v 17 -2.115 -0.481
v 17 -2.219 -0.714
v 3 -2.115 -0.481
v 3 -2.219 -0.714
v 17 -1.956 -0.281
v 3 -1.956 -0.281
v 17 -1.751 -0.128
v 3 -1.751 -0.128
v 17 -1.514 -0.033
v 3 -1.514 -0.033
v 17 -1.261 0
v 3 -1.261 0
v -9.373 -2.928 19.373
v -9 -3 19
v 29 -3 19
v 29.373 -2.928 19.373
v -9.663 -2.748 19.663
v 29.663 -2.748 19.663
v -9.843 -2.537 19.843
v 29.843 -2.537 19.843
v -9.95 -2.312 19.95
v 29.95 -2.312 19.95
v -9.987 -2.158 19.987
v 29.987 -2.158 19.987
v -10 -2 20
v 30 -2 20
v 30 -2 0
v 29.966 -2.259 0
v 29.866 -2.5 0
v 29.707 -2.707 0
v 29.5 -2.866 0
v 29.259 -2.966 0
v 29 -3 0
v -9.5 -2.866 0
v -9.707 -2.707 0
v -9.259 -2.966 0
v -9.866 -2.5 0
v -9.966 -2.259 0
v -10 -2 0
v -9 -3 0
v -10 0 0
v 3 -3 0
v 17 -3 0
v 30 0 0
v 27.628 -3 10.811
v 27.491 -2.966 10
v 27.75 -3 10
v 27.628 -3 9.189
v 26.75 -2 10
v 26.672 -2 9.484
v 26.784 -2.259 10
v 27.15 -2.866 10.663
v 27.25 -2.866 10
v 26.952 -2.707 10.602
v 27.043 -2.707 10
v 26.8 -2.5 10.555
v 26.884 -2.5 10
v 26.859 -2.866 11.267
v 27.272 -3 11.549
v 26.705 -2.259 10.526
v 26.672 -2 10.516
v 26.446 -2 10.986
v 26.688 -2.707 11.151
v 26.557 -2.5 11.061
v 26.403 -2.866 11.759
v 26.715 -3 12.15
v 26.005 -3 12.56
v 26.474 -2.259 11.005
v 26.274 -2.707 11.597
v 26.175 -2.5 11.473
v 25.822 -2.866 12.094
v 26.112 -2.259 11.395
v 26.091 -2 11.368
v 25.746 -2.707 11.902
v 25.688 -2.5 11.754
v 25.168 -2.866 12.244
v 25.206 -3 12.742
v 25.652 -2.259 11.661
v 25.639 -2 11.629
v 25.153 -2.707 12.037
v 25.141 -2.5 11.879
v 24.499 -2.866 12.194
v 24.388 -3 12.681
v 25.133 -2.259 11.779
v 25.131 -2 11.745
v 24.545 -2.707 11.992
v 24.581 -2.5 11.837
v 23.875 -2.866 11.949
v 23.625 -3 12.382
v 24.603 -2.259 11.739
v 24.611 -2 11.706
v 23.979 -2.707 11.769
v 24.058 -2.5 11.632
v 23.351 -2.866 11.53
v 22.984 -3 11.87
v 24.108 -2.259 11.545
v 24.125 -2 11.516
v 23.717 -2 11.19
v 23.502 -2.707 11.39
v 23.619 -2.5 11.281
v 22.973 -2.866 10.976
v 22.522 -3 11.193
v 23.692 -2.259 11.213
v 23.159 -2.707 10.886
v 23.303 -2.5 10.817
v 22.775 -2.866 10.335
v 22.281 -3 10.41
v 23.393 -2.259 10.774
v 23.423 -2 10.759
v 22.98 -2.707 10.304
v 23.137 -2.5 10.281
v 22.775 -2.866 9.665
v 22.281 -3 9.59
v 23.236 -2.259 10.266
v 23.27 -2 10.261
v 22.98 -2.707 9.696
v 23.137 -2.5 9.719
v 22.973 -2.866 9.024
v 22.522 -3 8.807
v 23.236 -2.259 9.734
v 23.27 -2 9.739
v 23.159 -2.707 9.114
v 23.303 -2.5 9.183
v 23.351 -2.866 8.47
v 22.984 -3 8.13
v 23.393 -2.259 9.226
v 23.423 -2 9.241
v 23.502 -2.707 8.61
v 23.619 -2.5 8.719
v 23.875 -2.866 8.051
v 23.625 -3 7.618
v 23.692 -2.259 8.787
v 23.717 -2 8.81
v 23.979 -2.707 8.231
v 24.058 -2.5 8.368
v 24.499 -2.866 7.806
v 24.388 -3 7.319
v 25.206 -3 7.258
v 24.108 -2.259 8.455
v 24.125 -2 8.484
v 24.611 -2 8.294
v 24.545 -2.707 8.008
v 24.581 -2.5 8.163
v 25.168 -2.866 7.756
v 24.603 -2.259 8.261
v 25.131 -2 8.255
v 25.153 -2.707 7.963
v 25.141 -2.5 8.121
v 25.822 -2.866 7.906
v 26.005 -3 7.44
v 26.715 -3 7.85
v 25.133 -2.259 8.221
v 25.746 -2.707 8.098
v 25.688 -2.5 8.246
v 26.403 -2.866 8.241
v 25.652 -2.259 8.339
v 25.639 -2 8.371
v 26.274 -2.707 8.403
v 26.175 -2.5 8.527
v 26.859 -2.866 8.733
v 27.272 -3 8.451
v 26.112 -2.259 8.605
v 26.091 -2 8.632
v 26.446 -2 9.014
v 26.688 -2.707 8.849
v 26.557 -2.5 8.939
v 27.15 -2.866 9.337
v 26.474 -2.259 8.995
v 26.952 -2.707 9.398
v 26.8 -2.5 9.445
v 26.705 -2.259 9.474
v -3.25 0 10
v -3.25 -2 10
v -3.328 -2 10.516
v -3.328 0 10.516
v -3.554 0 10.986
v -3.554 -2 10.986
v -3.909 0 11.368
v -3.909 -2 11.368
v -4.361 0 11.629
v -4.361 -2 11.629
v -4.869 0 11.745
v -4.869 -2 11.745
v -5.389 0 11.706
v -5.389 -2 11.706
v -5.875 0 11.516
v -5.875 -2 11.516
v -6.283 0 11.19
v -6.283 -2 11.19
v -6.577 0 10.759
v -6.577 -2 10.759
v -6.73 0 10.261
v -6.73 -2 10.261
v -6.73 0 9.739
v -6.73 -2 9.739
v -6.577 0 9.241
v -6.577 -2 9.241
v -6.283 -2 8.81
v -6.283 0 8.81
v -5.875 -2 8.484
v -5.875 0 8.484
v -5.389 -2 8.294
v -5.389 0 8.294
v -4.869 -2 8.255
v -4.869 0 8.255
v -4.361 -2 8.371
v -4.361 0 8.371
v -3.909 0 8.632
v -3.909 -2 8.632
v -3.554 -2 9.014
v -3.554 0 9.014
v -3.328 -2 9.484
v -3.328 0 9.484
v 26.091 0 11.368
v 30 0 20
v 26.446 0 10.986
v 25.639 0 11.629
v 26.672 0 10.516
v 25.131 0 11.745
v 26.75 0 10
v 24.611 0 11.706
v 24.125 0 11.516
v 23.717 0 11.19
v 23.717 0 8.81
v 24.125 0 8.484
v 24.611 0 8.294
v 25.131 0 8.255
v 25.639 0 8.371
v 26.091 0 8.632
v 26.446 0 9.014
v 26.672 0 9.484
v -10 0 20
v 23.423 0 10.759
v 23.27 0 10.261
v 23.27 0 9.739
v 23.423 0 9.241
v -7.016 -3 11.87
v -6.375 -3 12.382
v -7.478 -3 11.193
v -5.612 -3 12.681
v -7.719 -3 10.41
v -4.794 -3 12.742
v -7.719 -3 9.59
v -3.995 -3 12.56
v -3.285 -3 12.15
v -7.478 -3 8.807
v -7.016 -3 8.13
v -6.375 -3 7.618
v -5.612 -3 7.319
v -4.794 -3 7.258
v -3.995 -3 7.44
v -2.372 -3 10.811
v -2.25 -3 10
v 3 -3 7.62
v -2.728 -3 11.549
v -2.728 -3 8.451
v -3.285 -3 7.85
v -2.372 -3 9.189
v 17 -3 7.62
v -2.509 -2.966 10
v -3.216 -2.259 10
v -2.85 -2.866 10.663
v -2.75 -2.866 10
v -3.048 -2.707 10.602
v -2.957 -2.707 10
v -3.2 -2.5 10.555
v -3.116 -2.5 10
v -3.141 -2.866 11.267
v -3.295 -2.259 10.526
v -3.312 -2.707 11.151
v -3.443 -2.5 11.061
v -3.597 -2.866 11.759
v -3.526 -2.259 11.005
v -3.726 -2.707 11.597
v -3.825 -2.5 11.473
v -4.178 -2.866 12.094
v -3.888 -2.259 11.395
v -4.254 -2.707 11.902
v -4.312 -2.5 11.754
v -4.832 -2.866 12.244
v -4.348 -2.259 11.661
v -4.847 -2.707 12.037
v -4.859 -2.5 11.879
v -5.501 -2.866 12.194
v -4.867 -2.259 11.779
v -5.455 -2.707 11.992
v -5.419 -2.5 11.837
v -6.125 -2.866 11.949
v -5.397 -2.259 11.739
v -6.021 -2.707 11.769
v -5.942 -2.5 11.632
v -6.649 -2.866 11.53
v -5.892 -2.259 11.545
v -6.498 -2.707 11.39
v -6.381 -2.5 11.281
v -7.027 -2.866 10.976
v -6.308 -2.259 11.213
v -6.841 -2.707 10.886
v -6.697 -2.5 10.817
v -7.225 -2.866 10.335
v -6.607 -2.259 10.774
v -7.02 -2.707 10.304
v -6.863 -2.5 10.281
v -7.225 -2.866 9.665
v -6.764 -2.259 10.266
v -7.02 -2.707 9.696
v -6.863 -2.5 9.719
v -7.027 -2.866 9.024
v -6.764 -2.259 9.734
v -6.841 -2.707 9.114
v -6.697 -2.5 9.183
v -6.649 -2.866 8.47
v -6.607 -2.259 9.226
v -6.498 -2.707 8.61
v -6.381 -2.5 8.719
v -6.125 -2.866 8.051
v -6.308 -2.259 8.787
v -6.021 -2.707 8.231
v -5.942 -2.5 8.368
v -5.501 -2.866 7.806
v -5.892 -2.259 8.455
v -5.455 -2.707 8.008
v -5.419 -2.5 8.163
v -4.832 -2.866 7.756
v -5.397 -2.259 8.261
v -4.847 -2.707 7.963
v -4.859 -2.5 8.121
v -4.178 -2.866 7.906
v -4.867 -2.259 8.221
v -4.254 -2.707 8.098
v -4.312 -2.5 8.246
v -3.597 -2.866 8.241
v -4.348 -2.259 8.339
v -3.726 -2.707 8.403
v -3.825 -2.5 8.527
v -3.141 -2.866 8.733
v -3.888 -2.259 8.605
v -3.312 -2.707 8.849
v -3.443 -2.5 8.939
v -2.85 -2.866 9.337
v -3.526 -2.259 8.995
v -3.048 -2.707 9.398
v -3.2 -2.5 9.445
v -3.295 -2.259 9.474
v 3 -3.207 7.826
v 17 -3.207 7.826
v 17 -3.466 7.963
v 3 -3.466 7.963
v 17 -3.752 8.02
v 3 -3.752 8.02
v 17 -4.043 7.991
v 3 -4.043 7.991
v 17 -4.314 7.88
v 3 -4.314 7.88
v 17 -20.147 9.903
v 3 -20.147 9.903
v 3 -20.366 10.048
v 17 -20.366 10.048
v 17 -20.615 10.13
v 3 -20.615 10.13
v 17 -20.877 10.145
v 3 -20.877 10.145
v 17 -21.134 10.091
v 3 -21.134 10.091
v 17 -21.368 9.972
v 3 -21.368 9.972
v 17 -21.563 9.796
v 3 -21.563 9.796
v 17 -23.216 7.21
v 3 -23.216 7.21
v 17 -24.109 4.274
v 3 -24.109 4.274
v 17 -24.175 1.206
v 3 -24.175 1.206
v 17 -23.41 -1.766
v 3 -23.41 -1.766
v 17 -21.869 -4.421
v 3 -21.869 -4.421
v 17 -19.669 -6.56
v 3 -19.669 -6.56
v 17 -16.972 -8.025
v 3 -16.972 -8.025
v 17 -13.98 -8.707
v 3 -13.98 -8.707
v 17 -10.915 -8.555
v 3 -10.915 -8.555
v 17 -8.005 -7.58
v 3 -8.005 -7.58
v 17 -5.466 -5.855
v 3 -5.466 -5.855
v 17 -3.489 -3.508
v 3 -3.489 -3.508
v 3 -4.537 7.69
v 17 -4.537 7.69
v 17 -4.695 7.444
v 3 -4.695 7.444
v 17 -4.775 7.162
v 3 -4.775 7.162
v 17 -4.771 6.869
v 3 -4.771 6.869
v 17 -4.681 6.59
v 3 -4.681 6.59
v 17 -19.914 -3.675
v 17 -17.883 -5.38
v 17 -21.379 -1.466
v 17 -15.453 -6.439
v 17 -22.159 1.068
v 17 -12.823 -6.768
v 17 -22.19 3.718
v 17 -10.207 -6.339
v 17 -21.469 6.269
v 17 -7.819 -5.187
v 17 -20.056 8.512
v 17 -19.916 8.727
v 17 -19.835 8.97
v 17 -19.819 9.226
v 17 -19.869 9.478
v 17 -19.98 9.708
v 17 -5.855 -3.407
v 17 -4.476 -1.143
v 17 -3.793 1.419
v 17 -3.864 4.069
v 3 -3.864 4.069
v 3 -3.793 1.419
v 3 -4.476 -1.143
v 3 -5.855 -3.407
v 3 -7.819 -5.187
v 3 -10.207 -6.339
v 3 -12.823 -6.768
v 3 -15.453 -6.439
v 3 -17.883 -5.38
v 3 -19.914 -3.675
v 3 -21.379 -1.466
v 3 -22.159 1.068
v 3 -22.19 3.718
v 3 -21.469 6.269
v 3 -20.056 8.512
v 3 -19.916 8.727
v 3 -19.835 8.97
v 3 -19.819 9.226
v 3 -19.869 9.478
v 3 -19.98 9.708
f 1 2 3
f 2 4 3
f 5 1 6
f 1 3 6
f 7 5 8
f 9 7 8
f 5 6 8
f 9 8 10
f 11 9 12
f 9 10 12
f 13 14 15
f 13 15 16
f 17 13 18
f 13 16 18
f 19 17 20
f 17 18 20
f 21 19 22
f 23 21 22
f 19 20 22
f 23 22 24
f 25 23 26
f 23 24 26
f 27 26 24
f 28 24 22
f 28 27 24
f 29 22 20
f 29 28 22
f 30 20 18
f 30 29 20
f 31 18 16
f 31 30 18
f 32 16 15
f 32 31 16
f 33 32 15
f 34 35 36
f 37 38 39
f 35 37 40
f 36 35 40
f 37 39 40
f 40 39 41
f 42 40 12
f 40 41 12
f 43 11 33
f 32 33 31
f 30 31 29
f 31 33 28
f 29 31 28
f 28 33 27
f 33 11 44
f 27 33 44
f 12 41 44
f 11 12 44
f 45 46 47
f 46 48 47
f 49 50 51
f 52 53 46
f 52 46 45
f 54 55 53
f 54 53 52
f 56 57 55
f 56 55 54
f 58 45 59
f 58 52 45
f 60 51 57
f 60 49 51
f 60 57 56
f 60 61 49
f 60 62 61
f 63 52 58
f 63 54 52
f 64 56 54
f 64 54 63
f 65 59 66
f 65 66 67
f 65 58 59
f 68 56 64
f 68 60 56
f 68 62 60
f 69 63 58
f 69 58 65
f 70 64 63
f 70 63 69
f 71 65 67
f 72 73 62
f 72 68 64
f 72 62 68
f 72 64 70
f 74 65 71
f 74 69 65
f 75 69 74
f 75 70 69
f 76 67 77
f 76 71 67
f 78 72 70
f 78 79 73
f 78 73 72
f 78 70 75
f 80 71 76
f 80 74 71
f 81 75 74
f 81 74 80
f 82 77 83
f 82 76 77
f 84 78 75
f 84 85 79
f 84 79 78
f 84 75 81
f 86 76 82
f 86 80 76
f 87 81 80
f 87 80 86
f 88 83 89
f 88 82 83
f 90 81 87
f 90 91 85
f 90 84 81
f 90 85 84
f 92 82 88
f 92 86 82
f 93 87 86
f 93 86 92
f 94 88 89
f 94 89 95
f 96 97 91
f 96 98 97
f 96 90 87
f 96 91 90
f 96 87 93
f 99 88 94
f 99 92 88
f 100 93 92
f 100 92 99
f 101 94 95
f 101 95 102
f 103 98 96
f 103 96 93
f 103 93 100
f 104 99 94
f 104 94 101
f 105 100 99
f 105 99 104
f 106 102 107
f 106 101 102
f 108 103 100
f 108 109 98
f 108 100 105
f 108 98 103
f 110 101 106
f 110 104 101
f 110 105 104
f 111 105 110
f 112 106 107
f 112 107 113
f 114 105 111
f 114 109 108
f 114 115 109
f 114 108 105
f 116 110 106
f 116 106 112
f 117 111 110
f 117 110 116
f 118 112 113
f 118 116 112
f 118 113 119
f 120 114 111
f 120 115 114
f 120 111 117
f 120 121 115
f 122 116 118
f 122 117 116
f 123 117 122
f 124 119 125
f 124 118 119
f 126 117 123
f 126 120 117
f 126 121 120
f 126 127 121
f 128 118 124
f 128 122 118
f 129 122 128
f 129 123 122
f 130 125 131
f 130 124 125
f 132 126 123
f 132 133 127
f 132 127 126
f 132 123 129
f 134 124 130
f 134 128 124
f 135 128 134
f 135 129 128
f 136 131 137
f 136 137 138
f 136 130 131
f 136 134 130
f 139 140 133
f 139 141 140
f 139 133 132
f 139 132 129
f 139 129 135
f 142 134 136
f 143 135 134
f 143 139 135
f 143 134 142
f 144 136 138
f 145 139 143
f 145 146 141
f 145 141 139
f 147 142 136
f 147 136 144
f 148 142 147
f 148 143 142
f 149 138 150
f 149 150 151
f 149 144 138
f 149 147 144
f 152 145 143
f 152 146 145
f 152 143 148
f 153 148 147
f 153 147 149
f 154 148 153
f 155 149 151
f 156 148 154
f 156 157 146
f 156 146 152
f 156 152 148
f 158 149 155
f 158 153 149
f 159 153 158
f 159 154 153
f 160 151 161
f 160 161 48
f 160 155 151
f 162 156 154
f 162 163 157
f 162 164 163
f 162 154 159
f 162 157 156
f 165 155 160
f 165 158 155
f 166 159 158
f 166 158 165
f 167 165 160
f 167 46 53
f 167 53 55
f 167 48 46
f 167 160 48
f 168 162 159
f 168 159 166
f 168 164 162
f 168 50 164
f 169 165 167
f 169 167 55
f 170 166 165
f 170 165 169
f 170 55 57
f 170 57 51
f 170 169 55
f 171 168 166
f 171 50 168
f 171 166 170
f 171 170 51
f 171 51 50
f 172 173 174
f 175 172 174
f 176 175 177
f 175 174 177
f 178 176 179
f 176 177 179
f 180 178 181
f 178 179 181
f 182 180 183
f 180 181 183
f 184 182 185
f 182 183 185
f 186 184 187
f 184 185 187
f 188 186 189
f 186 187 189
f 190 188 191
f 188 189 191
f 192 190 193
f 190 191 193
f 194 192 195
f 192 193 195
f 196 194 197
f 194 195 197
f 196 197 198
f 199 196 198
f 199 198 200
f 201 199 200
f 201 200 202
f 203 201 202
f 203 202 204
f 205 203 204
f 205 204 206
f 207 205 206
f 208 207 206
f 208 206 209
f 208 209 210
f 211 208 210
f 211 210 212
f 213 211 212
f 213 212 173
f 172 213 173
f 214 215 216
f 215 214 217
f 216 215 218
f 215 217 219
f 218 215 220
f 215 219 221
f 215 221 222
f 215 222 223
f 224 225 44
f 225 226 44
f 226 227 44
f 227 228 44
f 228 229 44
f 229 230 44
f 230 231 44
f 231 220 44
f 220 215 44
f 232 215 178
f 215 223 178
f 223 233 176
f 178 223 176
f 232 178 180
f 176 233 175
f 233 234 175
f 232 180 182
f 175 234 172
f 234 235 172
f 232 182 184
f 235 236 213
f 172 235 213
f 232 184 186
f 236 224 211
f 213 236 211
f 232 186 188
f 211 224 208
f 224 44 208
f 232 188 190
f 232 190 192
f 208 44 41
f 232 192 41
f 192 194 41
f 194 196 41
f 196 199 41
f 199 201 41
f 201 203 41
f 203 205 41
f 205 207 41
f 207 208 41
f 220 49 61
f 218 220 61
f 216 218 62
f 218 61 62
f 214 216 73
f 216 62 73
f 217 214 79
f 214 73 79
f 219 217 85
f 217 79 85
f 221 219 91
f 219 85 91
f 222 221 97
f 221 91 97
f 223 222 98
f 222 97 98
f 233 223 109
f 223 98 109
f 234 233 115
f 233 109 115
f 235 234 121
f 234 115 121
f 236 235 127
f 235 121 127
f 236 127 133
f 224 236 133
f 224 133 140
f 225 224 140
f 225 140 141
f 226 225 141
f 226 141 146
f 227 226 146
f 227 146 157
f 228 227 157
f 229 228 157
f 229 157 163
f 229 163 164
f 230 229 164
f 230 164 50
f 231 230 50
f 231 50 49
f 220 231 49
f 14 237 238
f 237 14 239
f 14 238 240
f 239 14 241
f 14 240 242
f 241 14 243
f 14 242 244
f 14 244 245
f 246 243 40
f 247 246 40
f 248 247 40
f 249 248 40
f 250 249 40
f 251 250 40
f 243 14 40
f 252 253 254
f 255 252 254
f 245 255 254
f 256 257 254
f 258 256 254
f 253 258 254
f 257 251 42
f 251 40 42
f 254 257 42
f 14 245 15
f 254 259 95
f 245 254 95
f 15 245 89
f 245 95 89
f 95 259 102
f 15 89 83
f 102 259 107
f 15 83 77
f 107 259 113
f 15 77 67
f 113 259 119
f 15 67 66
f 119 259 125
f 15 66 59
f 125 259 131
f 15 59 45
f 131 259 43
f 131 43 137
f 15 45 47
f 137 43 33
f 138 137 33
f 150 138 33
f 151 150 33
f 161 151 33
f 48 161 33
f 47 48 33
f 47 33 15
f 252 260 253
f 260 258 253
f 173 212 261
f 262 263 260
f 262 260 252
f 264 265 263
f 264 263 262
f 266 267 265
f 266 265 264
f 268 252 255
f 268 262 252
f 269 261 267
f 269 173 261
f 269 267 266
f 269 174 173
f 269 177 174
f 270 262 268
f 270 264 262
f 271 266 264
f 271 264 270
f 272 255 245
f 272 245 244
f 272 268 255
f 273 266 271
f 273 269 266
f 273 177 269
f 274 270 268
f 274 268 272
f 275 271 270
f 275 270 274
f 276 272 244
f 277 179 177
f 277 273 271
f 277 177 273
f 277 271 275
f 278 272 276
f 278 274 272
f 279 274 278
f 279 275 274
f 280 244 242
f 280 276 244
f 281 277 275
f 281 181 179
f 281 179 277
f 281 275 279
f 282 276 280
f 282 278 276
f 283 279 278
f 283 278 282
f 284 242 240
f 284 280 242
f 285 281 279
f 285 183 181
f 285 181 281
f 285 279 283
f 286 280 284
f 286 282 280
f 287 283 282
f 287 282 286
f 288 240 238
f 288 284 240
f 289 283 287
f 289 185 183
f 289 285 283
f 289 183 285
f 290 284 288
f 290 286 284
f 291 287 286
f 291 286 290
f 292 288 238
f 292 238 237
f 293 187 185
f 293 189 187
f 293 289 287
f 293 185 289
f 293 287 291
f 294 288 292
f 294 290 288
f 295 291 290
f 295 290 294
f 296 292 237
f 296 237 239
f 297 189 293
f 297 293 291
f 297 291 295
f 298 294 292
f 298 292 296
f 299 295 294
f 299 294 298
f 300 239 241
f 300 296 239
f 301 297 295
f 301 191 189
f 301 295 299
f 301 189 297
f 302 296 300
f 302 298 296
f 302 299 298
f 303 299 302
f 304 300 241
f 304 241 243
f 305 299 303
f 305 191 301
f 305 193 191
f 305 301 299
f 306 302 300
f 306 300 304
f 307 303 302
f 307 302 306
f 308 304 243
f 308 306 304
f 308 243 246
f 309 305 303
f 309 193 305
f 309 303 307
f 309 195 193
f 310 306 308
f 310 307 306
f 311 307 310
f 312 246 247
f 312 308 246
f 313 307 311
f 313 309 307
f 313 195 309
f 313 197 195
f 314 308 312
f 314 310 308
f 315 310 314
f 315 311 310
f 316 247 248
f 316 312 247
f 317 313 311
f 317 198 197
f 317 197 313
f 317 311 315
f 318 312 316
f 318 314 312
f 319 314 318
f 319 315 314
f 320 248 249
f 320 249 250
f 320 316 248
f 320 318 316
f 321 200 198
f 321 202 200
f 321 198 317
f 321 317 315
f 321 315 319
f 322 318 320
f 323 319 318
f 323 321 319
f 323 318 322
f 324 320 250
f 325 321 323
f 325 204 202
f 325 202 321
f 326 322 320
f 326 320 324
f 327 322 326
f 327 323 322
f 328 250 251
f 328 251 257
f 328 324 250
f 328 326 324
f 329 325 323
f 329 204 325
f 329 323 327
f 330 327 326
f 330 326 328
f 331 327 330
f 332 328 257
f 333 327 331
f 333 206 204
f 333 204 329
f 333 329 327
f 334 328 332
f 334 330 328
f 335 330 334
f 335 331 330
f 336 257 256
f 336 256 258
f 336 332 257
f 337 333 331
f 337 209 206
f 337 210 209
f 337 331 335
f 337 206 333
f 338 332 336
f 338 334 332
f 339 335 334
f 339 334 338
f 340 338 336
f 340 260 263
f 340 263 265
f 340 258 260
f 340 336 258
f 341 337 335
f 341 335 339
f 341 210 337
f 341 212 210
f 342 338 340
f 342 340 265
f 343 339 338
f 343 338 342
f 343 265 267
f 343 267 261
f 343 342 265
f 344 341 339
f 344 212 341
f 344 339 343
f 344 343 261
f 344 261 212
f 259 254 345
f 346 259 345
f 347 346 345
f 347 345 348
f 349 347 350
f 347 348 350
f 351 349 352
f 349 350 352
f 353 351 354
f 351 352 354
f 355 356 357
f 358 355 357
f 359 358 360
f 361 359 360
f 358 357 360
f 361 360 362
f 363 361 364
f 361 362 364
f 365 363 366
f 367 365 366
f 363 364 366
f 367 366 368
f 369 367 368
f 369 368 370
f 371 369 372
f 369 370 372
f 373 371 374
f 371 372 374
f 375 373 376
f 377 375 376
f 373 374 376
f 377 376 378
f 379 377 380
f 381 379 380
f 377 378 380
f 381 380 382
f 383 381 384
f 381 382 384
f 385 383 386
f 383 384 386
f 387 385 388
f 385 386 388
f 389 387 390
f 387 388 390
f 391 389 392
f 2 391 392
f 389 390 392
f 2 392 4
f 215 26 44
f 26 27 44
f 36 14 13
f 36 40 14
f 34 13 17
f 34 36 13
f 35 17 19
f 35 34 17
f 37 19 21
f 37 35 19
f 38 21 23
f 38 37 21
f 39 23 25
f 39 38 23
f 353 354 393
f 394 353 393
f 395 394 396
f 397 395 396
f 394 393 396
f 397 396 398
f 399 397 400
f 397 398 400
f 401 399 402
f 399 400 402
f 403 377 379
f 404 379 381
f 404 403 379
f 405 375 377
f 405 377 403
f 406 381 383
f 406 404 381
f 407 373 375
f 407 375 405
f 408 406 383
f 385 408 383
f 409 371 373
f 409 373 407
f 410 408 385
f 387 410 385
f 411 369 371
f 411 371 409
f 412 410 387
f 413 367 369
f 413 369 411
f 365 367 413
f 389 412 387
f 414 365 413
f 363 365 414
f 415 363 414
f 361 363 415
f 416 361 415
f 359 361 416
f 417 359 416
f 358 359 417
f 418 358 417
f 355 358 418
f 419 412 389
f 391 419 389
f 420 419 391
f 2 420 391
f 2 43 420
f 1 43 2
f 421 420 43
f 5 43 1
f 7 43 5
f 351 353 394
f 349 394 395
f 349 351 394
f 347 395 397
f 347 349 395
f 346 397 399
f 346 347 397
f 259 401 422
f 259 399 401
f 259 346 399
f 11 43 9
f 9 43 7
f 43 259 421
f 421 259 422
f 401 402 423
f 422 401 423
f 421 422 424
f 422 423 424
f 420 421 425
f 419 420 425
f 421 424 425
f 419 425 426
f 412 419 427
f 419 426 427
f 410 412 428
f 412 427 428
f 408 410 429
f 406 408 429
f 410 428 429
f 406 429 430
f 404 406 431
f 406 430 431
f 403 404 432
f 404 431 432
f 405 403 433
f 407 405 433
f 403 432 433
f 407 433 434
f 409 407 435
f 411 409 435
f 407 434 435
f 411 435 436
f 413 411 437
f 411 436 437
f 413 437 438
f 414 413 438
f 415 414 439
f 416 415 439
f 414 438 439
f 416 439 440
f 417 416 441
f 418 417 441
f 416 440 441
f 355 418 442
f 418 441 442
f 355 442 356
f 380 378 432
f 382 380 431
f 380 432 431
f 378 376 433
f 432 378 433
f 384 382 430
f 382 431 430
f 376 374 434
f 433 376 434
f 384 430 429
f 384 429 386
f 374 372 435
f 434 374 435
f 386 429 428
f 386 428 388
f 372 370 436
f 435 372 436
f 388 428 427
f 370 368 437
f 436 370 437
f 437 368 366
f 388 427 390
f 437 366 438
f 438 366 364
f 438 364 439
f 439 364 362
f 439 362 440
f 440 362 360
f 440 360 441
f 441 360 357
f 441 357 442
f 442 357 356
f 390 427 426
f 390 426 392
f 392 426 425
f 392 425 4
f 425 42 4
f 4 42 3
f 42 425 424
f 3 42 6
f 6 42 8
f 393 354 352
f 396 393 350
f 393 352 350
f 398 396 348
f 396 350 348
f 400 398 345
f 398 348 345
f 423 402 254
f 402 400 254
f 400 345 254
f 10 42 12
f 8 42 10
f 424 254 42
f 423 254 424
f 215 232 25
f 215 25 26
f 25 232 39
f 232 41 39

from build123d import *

# Parameters (mm, degrees)
F1_DEPTH = 5
F5_DEPTH = 7
F6_DEPTH = 7
F7_DEPTH = 20
F8_R     = 1.75
F9_DEPTH = 25
F10_R    = 1


with BuildPart() as f1:
    # F0 (on Top) → F1 (new body)
    with BuildSketch(Plane.XY):
        Polygon((20, 0), (0, 0), (-10, 0), (-10, -3), (-2.5, -3), (0, -3), (20.5, -3), (23.5, -3), (30, -3), (30, 0), align=None)
    extrude(amount=F1_DEPTH)

    # F4 (on offset) → F5 (join)
    with BuildSketch(Plane.YZ.offset(10)):
        with BuildLine():
            ThreePointArc((-20.146994, 9.90317), (-20.877413, 10.144748), (-21.563228, 9.796137))
            ThreePointArc((-21.563228, 9.796137), (-18.370933, -7.385119), (-2.218958, -0.714286))
            ThreePointArc((-2.218958, -0.714286), (-1.858257, -0.198216), (-1.260643, 0))
            Line((-1.260643, 0), (0, 0))
            Line((0, 0), (0, 5))
            Line((0, 5), (-1.260643, 5))
            ThreePointArc((-1.260643, 5), (-1.858257, 5.198216), (-2.218958, 5.714286))
            ThreePointArc((-2.218958, 5.714286), (-2.524724, 6.602571), (-2.903535, 7.462248))
            ThreePointArc((-2.903535, 7.462248), (-3.517026, 7.979991), (-4.313516, 7.879836))
            ThreePointArc((-4.313516, 7.879836), (-4.745518, 7.30587), (-4.681243, 6.590376))
            ThreePointArc((-4.681243, 6.590376), (-14.149841, -6.698411), (-20.055883, 8.512273))
            ThreePointArc((-20.055883, 8.512273), (-19.819174, 9.226211), (-20.146994, 9.90317))
        make_face()
    extrude(amount=-F5_DEPTH)

    # F4 (on offset) → F6 (join)
    with BuildSketch(Plane.YZ.offset(10)):
        with BuildLine():
            ThreePointArc((-20.146994, 9.90317), (-20.877413, 10.144748), (-21.563228, 9.796137))
            ThreePointArc((-21.563228, 9.796137), (-18.370933, -7.385119), (-2.218958, -0.714286))
            ThreePointArc((-2.218958, -0.714286), (-1.858257, -0.198216), (-1.260643, 0))
            Line((-1.260643, 0), (0, 0))
            Line((0, 0), (0, 5))
            Line((0, 5), (-1.260643, 5))
            ThreePointArc((-1.260643, 5), (-1.858257, 5.198216), (-2.218958, 5.714286))
            ThreePointArc((-2.218958, 5.714286), (-2.524724, 6.602571), (-2.903535, 7.462248))
            ThreePointArc((-2.903535, 7.462248), (-3.517026, 7.979991), (-4.313516, 7.879836))
            ThreePointArc((-4.313516, 7.879836), (-4.745518, 7.30587), (-4.681243, 6.590376))
            ThreePointArc((-4.681243, 6.590376), (-14.149841, -6.698411), (-20.055883, 8.512273))
            ThreePointArc((-20.055883, 8.512273), (-19.819174, 9.226211), (-20.146994, 9.90317))
        make_face()
    extrude(amount=F6_DEPTH)

    # F0 (on Top) → F7 (join)
    with BuildSketch(Plane.XY):
        Polygon((20, 0), (0, 0), (-10, 0), (-10, -3), (-2.5, -3), (0, -3), (20.5, -3), (23.5, -3), (30, -3), (30, 0), align=None)
    extrude(amount=F7_DEPTH)

    # F8 (on face) → F9 (cut)
    with BuildSketch(Plane.XZ.offset(3)):
        with Locations((-5, 10)):
            Circle(F8_R)
        with Locations((25, 10)):
            Circle(F8_R)
    extrude(amount=-F9_DEPTH, mode=Mode.SUBTRACT)

    # F10
    f10_edges = [f1.edges().sort_by_distance(p)[0] for p in [
        (10, -3, 20),
        (30, -3, 10),
        (-10, -3, 10),
        (-6.75, -3, 10),
        (23.25, -3, 10),
    ]]
    fillet(f10_edges, radius=F10_R)


solid = f1.part
